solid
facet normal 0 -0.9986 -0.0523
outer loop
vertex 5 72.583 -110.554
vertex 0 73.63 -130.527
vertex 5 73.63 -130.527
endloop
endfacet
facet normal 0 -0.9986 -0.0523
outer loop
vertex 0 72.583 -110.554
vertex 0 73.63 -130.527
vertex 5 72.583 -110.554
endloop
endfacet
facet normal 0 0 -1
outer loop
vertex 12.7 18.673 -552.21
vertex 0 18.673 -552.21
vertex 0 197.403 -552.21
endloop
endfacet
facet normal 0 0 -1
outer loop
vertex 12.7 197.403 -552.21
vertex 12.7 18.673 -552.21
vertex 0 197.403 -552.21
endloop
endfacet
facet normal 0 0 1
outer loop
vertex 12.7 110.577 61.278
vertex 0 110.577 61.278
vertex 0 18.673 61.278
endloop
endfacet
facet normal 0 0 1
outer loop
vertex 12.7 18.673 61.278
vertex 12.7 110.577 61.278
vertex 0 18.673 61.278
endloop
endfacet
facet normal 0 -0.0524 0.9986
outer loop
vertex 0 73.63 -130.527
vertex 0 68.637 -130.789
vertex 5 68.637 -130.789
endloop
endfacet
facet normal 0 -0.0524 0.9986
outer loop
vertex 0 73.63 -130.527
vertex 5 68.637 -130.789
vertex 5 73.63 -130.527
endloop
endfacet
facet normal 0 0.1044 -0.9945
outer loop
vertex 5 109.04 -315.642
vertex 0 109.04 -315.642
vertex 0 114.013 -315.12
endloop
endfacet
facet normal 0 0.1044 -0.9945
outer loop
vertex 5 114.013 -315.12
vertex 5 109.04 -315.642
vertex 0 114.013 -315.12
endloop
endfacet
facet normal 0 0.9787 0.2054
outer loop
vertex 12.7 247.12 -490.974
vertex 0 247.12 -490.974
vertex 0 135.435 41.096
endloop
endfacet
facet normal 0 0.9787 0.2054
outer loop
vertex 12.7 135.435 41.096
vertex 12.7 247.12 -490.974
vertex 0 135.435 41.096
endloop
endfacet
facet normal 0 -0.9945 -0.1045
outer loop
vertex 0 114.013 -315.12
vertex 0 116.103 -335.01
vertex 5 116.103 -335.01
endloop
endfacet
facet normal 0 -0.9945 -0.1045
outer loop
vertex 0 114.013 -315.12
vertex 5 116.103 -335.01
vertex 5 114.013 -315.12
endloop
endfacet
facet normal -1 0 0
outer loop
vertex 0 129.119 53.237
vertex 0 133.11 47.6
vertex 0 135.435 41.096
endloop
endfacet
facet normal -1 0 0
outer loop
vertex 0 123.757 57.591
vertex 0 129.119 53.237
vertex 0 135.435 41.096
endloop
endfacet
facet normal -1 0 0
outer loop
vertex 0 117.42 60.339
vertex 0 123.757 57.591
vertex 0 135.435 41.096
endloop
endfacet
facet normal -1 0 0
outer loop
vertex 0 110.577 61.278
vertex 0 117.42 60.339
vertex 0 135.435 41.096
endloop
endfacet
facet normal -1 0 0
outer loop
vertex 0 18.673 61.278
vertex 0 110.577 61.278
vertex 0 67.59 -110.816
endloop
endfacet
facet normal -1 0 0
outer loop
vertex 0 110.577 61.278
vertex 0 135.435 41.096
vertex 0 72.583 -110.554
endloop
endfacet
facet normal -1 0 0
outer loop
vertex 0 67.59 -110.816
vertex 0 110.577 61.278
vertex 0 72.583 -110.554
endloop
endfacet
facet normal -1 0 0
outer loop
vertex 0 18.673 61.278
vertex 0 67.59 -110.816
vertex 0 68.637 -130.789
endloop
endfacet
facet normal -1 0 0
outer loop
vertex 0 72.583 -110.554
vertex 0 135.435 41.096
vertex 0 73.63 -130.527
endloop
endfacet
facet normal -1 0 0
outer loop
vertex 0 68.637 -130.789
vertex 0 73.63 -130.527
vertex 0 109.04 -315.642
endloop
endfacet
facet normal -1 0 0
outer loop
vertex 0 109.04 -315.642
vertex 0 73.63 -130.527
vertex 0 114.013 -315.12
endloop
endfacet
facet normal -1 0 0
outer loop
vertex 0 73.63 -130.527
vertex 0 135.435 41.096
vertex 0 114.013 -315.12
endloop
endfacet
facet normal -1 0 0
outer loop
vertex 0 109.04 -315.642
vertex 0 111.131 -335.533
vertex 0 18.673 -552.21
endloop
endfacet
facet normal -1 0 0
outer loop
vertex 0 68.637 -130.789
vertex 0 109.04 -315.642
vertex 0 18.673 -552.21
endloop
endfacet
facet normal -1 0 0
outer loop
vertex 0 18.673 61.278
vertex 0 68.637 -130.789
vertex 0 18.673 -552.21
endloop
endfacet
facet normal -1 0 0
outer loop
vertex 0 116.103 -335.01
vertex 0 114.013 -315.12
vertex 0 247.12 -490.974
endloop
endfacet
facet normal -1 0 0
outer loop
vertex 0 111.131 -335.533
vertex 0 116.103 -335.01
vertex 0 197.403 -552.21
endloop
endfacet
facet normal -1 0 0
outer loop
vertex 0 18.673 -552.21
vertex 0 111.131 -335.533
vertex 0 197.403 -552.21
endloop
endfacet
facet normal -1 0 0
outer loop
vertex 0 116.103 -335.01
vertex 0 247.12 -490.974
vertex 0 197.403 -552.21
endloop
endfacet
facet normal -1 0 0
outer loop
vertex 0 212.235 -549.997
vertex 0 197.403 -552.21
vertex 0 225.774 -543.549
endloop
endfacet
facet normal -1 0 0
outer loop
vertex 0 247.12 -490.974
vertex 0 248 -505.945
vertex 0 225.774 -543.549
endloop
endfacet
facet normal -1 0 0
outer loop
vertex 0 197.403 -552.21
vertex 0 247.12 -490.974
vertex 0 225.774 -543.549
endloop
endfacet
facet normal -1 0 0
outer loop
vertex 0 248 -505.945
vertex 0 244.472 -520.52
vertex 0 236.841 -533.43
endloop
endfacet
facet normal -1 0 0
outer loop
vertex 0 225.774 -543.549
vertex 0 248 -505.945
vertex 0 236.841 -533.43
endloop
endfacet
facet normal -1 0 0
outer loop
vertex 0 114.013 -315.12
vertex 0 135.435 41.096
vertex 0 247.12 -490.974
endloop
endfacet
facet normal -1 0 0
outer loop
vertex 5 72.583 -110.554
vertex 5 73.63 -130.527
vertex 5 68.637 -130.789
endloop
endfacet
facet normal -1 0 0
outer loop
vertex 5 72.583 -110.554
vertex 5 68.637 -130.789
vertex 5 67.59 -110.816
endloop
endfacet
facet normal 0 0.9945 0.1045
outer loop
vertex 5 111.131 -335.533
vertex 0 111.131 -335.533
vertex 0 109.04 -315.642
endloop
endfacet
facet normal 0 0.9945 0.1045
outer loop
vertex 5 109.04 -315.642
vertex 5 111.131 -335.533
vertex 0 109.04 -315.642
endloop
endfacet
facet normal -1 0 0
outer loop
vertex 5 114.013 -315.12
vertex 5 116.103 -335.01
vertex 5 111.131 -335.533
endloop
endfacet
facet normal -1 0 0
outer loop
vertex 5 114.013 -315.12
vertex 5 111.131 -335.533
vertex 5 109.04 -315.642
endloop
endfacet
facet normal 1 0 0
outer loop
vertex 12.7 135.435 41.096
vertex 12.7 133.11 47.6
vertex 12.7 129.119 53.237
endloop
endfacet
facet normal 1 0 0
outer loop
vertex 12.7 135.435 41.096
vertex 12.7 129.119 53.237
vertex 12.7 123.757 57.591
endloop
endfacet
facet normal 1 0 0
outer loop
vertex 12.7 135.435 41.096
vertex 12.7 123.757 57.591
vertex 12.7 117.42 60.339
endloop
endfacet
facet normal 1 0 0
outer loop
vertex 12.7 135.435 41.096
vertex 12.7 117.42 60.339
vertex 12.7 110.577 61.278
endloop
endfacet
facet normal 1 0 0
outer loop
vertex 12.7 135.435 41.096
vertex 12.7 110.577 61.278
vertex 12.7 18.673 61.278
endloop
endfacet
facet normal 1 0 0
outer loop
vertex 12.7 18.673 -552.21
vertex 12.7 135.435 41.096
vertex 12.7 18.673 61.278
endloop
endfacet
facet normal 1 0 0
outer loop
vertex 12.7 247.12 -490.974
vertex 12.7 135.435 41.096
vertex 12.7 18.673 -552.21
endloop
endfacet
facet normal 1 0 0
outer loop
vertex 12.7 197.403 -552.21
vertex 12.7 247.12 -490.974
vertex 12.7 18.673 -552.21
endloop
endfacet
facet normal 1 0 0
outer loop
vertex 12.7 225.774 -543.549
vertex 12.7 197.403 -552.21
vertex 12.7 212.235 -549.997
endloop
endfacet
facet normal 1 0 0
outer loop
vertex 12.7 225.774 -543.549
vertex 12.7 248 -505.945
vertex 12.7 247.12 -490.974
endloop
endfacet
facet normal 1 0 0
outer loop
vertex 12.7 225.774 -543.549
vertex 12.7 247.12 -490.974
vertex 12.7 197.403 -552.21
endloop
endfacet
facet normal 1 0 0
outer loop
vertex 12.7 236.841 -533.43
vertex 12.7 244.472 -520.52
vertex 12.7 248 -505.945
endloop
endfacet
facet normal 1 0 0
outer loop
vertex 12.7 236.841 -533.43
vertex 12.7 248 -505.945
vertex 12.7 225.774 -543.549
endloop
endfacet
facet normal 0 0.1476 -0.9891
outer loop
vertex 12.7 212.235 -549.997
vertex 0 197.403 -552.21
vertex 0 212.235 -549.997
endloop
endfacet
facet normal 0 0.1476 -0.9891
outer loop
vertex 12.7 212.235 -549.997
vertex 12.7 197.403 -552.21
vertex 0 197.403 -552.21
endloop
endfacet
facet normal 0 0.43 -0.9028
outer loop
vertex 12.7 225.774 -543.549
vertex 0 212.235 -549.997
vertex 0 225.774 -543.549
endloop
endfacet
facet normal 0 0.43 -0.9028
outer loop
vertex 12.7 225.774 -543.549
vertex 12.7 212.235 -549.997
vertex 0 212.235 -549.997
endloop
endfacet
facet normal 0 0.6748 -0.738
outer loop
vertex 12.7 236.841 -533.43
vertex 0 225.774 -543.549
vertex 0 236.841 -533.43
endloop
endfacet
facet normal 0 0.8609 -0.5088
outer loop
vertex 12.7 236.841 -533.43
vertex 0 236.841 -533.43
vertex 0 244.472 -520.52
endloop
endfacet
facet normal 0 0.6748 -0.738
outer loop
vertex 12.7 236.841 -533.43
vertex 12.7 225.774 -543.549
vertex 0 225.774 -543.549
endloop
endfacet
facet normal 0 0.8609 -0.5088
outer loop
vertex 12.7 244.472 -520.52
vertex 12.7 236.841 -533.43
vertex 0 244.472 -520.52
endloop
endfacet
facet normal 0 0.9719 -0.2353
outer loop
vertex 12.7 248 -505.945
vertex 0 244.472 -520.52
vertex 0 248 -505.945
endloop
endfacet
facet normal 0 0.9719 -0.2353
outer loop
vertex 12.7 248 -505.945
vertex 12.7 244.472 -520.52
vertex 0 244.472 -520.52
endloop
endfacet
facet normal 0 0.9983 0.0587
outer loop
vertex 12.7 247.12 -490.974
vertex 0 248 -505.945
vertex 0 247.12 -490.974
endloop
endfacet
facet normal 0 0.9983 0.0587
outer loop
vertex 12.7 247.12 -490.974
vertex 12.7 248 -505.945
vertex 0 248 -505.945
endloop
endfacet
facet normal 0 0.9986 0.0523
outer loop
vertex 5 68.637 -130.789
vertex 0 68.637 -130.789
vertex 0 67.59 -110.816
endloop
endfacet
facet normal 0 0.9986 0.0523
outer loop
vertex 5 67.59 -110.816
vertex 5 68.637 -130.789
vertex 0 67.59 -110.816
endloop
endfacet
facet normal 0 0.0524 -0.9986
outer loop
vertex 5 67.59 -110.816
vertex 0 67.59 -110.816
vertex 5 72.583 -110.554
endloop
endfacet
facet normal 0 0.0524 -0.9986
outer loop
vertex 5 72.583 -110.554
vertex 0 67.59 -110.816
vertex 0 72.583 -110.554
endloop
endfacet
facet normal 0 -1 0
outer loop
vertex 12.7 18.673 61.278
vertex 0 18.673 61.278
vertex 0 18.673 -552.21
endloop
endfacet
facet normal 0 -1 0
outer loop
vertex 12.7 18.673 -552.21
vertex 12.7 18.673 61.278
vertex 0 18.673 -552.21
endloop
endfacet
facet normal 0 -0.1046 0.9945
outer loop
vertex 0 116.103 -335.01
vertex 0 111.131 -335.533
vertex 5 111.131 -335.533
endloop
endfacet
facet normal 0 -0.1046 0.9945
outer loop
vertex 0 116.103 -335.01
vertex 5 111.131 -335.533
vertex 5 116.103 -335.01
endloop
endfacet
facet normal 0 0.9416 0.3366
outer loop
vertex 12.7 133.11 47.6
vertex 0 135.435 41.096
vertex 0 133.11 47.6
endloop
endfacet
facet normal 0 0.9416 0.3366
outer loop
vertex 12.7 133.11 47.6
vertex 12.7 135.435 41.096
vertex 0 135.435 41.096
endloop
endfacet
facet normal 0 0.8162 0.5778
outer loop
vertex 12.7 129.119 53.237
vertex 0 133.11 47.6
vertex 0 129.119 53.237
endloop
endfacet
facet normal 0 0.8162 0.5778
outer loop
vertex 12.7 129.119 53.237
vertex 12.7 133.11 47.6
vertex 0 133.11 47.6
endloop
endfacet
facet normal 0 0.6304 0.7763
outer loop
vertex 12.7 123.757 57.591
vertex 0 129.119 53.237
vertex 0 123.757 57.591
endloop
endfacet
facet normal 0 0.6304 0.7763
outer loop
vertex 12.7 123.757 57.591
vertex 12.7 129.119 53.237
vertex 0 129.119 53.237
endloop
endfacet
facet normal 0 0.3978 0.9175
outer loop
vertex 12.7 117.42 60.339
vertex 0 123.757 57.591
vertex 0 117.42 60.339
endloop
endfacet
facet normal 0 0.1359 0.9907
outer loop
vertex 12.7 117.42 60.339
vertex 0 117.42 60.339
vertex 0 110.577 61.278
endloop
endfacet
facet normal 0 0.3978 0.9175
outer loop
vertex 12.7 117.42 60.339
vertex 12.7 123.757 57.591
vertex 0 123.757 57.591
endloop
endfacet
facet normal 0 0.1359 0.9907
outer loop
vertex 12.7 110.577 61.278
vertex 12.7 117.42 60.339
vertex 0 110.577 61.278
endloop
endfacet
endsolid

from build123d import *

# Parameters (mm, degrees)
BOSS_EXTRUDE1_DEPTH = 12.7
FILLET2_R           = 50.8
FILLET3_R           = 25.4
SKETCH2_W           = 20
SKETCH2_H           = 5
CUT_EXTRUDE1_DEPTH  = 5
SKETCH3_W           = 20
SKETCH3_H           = 5
CUT_EXTRUDE2_DEPTH  = 5


with BuildPart() as part:
    # Sketch1 → Boss-Extrude1 (new body)
    with BuildSketch(Plane(origin=(0, 0, 0), x_dir=(0, 0, -1), z_dir=(1, 0, 0))):
        Polygon((44.210163248, 18.673348758), (552.210163248, 18.673348758), (552.210163248, 259.973348758), (-61.277709779, 131.198589616), (-61.277709779, 18.673348758), align=None)
    extrude(amount=BOSS_EXTRUDE1_DEPTH)

    # Fillet2
    fillet2_edges = [part.edges().sort_by_distance(p)[0] for p in [
        (6.35, 259.973348758, -552.210163248),
    ]]
    fillet(fillet2_edges, radius=FILLET2_R)

    # Fillet3
    fillet3_edges = [part.edges().sort_by_distance(p)[0] for p in [
        (6.35, 131.198589616, 61.277709779),
    ]]
    fillet(fillet3_edges, radius=FILLET3_R)

    # Sketch2 → Cut-Extrude1 (cut)
    with BuildSketch(Plane(origin=(0, -2.351141299, -40.658116651), x_dir=(0, -0.05233595624294396, 0.998629534754574), z_dir=(-1, 0, 0))):
        with Locations((-83.722290221, 68.673348758)):
            Rectangle(SKETCH2_W, SKETCH2_H)
    extrude(amount=-CUT_EXTRUDE1_DEPTH, mode=Mode.SUBTRACT)

    # Sketch3 → Cut-Extrude2 (cut)
    with BuildSketch(Plane(origin=(0, -30.516141981, -7.826738697), x_dir=(0, -0.10452846326765375, 0.9945218953682733), z_dir=(-1, 0, 0))):
        with Locations((-330.716980881, 109.116306173)):
            Rectangle(SKETCH3_W, SKETCH3_H)
    extrude(amount=-CUT_EXTRUDE2_DEPTH, mode=Mode.SUBTRACT)


solid = part.part
